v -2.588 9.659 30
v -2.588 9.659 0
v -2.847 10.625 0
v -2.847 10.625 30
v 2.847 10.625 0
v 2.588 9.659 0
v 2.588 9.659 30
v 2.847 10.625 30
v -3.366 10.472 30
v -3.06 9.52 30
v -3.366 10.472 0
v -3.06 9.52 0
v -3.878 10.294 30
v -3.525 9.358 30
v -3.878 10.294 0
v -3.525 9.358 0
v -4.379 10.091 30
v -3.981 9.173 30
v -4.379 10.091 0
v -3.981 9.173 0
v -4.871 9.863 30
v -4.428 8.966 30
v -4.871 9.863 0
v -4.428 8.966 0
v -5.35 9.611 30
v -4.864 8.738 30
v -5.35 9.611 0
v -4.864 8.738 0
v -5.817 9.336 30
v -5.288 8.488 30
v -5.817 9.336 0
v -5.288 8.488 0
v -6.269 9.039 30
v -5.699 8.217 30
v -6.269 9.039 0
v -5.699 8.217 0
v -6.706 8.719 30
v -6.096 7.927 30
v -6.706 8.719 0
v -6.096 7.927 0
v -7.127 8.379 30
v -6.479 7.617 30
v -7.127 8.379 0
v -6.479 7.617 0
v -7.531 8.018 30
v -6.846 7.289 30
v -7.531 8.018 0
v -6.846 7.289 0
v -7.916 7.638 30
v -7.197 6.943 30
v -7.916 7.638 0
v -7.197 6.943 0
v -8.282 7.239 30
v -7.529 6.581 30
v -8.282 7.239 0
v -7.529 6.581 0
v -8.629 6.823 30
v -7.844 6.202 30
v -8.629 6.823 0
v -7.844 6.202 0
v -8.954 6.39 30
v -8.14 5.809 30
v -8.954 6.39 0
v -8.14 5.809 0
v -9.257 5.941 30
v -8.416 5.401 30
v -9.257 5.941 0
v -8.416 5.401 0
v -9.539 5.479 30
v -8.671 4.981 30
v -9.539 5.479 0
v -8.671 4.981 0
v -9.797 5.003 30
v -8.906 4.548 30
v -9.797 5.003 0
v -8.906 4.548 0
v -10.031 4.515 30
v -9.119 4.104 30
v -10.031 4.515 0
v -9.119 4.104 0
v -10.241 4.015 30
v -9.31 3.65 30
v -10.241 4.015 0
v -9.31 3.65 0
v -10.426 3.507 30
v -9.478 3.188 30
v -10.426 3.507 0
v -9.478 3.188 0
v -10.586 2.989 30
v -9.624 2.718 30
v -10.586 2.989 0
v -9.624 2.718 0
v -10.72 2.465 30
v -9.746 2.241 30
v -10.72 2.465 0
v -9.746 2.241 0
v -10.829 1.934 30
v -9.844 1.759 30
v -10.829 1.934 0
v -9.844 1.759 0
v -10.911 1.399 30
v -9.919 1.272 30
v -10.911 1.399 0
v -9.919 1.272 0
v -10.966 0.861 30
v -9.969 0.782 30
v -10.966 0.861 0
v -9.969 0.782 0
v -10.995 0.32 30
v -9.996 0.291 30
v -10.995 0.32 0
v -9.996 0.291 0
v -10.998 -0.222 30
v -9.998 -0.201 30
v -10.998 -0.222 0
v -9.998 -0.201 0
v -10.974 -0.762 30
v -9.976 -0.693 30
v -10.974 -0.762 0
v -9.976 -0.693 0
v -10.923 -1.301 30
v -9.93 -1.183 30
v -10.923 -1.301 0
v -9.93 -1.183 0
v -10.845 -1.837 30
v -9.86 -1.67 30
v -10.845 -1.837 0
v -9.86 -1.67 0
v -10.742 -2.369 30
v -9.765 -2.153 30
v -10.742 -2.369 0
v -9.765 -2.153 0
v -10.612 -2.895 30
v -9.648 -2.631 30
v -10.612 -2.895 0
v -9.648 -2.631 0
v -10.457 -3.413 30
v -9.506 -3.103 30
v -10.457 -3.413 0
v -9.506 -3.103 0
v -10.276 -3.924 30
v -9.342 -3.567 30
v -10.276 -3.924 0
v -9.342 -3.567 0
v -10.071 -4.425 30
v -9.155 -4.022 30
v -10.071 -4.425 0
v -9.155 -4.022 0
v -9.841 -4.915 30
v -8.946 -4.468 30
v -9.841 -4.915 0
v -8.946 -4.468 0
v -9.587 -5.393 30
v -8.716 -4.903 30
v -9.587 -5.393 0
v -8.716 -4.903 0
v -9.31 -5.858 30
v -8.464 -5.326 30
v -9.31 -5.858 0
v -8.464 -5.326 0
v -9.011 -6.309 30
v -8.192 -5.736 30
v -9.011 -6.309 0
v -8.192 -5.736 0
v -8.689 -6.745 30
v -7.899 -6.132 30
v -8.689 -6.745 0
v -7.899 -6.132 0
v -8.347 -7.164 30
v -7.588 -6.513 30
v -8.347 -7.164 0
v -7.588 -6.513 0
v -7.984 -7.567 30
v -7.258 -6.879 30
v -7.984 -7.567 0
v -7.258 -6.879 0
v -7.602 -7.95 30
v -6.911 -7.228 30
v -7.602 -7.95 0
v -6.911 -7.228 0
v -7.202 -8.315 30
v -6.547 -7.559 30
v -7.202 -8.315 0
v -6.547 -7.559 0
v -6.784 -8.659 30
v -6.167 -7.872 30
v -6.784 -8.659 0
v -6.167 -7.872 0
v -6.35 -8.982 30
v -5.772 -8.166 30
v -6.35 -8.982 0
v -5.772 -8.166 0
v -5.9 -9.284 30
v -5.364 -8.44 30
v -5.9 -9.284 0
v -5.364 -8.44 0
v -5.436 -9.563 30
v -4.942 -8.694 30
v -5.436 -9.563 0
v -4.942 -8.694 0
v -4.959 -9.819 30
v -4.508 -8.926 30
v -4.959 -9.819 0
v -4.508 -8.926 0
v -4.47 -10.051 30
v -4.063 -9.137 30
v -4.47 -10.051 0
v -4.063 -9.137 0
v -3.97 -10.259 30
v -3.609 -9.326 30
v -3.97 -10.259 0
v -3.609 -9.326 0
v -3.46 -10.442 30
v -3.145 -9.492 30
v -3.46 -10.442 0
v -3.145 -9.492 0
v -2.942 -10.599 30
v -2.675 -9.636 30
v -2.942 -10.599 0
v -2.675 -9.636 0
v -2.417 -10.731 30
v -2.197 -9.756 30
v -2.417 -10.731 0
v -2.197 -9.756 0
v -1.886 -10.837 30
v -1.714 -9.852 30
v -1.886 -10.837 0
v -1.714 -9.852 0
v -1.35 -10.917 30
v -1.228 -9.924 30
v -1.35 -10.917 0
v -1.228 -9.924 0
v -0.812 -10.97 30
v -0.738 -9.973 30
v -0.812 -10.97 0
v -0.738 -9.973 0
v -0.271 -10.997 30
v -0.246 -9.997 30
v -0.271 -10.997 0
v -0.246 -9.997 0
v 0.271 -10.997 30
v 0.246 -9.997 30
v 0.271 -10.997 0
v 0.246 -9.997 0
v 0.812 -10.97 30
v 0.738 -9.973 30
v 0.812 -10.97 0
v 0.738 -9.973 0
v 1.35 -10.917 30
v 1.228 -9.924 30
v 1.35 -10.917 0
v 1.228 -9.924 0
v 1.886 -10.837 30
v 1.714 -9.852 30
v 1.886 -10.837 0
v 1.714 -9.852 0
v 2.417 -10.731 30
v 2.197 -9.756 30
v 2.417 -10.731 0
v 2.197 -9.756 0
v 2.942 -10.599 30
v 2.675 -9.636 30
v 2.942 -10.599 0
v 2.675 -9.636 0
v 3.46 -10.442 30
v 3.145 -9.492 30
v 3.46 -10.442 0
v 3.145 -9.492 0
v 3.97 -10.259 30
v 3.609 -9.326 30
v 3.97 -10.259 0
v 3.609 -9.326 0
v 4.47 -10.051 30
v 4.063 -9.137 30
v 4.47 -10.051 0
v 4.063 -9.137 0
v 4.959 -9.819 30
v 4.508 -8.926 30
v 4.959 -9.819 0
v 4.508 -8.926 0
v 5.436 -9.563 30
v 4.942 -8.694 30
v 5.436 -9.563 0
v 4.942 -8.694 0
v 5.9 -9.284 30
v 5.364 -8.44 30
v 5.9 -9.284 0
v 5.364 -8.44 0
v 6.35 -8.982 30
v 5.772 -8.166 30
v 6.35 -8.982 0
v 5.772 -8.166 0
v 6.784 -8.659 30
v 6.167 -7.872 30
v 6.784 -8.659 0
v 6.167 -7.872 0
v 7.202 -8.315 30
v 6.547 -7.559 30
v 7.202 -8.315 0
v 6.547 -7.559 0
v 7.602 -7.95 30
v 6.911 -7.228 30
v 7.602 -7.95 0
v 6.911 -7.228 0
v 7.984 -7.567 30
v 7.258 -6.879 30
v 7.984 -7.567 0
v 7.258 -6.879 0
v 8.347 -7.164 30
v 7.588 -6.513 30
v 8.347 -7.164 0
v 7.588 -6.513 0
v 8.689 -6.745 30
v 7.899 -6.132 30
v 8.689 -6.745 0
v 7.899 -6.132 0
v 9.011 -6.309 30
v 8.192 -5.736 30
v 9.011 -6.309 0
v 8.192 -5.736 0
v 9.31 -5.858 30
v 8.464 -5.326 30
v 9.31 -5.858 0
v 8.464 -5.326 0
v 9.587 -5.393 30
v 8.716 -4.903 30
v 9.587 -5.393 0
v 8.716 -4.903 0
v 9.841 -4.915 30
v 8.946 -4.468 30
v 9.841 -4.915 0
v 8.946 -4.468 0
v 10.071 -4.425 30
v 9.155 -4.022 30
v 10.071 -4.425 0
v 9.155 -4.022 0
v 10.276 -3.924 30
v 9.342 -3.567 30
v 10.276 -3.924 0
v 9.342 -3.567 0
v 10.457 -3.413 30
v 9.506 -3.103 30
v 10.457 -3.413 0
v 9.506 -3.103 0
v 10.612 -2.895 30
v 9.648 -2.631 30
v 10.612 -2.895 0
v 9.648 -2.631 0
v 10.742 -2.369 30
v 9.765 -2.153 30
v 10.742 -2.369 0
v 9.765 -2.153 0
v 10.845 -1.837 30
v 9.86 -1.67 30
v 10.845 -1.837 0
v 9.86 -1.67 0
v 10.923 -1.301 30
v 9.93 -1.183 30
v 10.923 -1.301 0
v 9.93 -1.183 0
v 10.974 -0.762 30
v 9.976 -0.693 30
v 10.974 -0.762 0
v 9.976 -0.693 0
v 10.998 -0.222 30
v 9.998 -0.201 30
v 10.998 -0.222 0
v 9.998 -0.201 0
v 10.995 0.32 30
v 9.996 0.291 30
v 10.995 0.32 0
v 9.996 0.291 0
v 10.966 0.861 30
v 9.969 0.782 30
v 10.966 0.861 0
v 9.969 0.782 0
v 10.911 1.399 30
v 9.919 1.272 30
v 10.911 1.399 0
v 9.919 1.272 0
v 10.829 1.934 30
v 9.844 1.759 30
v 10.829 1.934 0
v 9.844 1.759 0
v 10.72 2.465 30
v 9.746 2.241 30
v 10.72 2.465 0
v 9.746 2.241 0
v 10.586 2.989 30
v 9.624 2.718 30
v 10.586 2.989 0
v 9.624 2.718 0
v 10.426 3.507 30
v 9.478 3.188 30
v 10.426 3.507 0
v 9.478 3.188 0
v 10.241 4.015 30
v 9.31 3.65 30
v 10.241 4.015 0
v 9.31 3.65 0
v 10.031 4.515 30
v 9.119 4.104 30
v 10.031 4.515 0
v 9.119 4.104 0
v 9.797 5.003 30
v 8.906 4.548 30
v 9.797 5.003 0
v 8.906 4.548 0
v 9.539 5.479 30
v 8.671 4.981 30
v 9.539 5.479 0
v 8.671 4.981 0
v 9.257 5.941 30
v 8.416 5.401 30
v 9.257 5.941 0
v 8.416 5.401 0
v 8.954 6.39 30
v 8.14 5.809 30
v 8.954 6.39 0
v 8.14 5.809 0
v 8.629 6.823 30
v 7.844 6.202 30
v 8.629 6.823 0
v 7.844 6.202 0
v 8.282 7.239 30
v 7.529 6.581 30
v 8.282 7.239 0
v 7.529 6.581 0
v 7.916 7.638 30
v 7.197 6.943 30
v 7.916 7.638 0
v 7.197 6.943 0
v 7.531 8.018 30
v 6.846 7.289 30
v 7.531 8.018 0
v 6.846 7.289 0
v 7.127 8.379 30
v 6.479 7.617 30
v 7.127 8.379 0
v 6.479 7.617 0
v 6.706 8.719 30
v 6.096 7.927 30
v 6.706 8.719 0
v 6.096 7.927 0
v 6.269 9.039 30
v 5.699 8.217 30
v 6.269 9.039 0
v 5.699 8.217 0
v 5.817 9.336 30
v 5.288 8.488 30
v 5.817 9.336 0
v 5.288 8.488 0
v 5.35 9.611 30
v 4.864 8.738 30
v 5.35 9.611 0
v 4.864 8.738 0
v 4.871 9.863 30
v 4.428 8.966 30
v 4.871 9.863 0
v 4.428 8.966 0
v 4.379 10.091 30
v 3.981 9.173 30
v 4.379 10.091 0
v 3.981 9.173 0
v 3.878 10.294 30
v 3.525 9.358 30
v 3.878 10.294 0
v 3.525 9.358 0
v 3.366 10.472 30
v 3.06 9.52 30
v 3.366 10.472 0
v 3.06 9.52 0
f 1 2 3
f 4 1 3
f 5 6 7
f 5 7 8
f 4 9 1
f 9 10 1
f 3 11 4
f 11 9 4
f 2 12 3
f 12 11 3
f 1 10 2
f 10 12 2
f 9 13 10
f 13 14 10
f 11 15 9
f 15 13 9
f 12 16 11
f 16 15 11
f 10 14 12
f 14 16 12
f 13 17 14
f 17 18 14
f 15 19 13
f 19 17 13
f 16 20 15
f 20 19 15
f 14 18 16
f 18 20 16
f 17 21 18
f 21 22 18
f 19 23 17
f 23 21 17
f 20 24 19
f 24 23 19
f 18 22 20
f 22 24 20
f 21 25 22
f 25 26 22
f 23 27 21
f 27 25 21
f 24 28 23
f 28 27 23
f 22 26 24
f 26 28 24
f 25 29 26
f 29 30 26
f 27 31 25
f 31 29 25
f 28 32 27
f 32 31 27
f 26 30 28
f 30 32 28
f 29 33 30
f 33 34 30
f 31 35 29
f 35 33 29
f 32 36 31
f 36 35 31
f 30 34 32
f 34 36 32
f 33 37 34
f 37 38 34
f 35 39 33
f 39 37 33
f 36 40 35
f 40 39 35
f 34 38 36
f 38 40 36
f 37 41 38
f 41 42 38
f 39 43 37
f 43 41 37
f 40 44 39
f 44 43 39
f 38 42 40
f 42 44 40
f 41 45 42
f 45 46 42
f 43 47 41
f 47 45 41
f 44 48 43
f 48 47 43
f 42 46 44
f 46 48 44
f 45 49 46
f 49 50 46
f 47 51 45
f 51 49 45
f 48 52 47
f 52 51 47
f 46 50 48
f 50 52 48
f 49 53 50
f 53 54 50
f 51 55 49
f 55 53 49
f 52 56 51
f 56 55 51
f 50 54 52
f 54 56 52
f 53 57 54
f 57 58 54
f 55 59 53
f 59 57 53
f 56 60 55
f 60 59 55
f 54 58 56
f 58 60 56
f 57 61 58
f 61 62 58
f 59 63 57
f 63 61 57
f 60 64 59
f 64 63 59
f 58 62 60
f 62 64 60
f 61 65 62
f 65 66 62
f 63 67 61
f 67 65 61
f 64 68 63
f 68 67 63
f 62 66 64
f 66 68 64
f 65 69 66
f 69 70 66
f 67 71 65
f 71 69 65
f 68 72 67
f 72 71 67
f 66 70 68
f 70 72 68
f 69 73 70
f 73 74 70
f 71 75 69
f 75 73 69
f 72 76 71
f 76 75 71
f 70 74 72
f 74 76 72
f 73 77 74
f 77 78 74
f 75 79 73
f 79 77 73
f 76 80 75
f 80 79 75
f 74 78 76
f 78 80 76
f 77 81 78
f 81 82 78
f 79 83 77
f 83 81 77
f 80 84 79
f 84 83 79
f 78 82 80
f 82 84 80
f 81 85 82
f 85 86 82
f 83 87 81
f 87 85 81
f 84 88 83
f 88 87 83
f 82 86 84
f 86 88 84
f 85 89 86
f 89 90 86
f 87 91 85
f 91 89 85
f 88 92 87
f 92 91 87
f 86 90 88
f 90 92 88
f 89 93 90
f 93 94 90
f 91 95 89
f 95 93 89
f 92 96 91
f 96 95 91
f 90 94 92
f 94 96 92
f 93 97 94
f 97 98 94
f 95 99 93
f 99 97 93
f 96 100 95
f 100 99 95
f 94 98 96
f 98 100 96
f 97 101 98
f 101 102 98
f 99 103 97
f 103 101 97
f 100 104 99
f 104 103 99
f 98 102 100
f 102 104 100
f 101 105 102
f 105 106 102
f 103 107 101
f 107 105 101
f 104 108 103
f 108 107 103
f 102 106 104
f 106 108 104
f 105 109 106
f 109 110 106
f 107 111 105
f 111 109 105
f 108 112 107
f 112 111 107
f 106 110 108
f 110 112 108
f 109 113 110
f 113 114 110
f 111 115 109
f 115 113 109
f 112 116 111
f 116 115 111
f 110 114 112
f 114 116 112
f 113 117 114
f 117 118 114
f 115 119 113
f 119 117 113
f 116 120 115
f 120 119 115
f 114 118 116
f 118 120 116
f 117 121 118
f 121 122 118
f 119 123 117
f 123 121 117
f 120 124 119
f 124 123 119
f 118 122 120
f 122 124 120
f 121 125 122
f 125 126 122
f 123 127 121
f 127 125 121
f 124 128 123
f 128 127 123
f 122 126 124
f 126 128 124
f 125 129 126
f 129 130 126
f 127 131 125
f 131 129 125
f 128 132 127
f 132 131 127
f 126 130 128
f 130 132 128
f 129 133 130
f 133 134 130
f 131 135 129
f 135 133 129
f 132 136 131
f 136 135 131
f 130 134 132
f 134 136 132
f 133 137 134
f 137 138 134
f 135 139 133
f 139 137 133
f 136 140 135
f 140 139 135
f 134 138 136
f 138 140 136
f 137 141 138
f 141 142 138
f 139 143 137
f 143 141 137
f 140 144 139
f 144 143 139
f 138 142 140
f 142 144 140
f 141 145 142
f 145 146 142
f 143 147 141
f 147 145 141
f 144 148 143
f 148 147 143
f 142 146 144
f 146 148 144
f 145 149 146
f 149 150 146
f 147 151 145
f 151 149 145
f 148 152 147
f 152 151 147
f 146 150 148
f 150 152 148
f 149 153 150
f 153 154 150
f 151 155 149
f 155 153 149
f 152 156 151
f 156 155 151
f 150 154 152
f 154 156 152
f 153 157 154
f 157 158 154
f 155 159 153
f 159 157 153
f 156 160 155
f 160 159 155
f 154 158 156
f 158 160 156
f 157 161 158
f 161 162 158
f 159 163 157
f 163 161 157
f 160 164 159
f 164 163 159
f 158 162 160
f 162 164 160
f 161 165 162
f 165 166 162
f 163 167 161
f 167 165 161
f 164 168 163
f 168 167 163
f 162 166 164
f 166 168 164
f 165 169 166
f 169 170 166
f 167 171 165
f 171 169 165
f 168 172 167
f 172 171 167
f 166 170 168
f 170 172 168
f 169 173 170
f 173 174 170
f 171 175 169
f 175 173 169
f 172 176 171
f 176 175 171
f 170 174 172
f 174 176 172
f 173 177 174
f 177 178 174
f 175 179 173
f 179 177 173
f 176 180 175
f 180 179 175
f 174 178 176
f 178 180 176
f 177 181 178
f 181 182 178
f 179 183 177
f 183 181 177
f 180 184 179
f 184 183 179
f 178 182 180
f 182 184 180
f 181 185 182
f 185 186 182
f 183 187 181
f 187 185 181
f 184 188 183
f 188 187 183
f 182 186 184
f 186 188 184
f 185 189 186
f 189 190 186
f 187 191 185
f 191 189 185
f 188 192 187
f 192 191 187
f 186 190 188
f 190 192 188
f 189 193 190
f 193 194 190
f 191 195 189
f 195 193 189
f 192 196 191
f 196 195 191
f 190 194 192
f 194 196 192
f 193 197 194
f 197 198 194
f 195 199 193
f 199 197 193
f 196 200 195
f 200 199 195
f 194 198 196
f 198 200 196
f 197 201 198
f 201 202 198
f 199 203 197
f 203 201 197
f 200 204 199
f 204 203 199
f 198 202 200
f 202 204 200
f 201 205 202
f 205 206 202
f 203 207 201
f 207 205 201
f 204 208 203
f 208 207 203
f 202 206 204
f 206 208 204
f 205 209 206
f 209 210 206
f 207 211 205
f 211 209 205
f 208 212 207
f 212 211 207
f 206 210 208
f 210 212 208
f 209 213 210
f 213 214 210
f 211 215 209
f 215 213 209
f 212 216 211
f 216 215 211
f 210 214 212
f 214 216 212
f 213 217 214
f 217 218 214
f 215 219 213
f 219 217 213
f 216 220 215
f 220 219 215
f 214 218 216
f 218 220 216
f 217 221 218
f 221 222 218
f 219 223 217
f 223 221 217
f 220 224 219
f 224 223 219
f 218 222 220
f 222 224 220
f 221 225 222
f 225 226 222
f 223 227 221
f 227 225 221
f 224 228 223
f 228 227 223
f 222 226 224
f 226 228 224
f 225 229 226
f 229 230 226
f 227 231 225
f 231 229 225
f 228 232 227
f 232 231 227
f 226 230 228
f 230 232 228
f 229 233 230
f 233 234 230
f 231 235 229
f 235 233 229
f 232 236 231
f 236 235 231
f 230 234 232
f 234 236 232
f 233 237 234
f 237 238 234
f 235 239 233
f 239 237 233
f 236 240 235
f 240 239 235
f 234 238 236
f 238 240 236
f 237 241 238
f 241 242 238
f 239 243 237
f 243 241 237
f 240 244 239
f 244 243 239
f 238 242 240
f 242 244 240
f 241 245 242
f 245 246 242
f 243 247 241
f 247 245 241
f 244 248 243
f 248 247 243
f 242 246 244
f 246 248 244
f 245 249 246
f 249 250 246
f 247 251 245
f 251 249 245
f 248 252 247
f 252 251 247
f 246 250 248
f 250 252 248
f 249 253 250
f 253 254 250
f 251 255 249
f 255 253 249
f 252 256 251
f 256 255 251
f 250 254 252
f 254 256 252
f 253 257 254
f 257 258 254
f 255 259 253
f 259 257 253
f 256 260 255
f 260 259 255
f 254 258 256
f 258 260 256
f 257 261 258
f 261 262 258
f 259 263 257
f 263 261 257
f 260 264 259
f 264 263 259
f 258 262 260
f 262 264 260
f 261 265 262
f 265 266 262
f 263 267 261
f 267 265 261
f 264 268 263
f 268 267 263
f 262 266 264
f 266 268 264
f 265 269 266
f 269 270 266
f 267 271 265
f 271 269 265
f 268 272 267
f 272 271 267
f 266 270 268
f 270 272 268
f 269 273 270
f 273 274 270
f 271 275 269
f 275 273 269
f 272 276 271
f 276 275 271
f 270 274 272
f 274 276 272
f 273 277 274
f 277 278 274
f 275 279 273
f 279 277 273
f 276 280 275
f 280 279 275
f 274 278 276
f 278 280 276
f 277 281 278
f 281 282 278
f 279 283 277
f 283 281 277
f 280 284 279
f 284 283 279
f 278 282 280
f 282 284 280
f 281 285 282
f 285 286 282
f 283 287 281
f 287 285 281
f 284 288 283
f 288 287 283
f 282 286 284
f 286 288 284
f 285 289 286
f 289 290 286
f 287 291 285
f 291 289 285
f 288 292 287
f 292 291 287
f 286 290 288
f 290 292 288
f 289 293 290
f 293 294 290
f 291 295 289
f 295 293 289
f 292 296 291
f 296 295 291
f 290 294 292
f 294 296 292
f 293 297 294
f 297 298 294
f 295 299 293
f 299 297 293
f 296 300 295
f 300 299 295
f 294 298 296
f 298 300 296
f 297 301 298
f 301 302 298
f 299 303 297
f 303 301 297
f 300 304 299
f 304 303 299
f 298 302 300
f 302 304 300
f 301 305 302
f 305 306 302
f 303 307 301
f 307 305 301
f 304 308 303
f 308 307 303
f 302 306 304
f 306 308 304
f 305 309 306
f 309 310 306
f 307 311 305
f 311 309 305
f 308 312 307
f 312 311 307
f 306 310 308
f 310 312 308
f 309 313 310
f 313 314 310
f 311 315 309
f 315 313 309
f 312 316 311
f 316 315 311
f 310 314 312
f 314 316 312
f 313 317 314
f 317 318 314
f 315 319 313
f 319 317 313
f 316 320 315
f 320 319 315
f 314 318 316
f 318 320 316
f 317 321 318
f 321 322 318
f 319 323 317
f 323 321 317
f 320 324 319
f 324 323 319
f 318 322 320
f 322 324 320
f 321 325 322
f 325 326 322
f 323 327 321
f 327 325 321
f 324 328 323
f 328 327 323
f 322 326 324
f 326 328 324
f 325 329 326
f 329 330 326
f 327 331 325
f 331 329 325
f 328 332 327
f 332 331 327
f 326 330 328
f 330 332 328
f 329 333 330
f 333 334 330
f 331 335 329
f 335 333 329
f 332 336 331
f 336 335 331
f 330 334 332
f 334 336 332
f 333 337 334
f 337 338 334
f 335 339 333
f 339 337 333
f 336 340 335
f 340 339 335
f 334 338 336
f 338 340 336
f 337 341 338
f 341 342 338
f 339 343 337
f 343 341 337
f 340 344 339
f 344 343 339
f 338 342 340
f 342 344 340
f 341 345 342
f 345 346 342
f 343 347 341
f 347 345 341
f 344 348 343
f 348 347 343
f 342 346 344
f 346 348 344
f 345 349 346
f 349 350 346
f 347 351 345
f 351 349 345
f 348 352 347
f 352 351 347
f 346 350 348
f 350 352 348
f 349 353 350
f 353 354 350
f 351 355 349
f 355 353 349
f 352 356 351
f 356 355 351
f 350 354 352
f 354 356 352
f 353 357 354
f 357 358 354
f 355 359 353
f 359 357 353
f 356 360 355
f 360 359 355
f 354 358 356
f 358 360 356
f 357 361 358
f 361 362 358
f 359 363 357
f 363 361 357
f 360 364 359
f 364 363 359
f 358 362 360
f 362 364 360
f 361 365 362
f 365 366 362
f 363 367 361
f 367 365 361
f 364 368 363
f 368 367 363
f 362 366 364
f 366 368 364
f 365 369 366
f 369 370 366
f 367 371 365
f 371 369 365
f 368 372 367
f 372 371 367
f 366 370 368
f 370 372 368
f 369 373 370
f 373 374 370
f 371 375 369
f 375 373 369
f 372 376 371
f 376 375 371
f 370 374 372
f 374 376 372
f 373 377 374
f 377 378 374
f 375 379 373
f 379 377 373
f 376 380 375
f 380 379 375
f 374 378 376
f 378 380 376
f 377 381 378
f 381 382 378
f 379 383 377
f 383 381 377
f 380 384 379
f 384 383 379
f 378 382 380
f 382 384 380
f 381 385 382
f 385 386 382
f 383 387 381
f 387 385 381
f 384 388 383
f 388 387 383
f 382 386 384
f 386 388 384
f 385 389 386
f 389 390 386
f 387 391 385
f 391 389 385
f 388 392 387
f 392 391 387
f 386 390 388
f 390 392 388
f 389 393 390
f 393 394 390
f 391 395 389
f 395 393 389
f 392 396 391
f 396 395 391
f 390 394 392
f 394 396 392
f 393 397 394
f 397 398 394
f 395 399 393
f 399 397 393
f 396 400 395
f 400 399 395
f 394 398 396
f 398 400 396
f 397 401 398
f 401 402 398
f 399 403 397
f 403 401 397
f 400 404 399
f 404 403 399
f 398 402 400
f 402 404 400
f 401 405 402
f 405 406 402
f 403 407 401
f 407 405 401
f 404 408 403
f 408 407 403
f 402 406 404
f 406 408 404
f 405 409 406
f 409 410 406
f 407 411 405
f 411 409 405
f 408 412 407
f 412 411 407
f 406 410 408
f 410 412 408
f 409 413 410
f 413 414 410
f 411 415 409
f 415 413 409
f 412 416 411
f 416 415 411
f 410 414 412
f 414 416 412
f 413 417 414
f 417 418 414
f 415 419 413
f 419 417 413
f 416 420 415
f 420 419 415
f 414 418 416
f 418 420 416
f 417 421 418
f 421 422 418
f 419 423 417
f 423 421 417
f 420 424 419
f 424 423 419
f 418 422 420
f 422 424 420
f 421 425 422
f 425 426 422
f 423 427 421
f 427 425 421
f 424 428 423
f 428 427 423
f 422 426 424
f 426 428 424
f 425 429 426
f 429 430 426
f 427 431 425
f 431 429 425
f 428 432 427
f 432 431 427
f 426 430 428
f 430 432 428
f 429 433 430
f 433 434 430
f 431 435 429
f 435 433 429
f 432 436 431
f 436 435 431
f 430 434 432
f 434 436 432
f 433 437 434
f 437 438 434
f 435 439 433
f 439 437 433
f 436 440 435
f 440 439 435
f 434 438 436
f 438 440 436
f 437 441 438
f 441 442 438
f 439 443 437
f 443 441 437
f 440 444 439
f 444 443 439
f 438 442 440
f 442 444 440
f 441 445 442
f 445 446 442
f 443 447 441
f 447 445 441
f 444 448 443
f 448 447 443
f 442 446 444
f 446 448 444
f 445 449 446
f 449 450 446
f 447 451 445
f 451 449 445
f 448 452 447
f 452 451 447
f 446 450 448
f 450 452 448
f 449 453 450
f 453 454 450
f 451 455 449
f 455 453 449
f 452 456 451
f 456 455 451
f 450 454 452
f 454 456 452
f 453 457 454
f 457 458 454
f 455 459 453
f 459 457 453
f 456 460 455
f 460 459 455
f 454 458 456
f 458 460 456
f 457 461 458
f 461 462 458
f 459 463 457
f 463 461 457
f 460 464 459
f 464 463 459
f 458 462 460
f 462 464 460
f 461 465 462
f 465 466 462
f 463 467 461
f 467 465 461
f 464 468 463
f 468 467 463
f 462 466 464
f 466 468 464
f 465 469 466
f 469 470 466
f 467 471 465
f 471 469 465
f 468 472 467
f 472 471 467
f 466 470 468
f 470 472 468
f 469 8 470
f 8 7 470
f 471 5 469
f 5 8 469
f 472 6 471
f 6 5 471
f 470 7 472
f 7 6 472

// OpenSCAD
$fn = 128;


module half_ring(a=0, h=30, r=10, thick=1){
    rotate([0,0, a/2 + 90])
        rotate_extrude(angle = 360 - a)
            translate([r, 0, 0])
                square([thick, h]);
}


half_ring(a=30, h=30, r=10, thick=1);
